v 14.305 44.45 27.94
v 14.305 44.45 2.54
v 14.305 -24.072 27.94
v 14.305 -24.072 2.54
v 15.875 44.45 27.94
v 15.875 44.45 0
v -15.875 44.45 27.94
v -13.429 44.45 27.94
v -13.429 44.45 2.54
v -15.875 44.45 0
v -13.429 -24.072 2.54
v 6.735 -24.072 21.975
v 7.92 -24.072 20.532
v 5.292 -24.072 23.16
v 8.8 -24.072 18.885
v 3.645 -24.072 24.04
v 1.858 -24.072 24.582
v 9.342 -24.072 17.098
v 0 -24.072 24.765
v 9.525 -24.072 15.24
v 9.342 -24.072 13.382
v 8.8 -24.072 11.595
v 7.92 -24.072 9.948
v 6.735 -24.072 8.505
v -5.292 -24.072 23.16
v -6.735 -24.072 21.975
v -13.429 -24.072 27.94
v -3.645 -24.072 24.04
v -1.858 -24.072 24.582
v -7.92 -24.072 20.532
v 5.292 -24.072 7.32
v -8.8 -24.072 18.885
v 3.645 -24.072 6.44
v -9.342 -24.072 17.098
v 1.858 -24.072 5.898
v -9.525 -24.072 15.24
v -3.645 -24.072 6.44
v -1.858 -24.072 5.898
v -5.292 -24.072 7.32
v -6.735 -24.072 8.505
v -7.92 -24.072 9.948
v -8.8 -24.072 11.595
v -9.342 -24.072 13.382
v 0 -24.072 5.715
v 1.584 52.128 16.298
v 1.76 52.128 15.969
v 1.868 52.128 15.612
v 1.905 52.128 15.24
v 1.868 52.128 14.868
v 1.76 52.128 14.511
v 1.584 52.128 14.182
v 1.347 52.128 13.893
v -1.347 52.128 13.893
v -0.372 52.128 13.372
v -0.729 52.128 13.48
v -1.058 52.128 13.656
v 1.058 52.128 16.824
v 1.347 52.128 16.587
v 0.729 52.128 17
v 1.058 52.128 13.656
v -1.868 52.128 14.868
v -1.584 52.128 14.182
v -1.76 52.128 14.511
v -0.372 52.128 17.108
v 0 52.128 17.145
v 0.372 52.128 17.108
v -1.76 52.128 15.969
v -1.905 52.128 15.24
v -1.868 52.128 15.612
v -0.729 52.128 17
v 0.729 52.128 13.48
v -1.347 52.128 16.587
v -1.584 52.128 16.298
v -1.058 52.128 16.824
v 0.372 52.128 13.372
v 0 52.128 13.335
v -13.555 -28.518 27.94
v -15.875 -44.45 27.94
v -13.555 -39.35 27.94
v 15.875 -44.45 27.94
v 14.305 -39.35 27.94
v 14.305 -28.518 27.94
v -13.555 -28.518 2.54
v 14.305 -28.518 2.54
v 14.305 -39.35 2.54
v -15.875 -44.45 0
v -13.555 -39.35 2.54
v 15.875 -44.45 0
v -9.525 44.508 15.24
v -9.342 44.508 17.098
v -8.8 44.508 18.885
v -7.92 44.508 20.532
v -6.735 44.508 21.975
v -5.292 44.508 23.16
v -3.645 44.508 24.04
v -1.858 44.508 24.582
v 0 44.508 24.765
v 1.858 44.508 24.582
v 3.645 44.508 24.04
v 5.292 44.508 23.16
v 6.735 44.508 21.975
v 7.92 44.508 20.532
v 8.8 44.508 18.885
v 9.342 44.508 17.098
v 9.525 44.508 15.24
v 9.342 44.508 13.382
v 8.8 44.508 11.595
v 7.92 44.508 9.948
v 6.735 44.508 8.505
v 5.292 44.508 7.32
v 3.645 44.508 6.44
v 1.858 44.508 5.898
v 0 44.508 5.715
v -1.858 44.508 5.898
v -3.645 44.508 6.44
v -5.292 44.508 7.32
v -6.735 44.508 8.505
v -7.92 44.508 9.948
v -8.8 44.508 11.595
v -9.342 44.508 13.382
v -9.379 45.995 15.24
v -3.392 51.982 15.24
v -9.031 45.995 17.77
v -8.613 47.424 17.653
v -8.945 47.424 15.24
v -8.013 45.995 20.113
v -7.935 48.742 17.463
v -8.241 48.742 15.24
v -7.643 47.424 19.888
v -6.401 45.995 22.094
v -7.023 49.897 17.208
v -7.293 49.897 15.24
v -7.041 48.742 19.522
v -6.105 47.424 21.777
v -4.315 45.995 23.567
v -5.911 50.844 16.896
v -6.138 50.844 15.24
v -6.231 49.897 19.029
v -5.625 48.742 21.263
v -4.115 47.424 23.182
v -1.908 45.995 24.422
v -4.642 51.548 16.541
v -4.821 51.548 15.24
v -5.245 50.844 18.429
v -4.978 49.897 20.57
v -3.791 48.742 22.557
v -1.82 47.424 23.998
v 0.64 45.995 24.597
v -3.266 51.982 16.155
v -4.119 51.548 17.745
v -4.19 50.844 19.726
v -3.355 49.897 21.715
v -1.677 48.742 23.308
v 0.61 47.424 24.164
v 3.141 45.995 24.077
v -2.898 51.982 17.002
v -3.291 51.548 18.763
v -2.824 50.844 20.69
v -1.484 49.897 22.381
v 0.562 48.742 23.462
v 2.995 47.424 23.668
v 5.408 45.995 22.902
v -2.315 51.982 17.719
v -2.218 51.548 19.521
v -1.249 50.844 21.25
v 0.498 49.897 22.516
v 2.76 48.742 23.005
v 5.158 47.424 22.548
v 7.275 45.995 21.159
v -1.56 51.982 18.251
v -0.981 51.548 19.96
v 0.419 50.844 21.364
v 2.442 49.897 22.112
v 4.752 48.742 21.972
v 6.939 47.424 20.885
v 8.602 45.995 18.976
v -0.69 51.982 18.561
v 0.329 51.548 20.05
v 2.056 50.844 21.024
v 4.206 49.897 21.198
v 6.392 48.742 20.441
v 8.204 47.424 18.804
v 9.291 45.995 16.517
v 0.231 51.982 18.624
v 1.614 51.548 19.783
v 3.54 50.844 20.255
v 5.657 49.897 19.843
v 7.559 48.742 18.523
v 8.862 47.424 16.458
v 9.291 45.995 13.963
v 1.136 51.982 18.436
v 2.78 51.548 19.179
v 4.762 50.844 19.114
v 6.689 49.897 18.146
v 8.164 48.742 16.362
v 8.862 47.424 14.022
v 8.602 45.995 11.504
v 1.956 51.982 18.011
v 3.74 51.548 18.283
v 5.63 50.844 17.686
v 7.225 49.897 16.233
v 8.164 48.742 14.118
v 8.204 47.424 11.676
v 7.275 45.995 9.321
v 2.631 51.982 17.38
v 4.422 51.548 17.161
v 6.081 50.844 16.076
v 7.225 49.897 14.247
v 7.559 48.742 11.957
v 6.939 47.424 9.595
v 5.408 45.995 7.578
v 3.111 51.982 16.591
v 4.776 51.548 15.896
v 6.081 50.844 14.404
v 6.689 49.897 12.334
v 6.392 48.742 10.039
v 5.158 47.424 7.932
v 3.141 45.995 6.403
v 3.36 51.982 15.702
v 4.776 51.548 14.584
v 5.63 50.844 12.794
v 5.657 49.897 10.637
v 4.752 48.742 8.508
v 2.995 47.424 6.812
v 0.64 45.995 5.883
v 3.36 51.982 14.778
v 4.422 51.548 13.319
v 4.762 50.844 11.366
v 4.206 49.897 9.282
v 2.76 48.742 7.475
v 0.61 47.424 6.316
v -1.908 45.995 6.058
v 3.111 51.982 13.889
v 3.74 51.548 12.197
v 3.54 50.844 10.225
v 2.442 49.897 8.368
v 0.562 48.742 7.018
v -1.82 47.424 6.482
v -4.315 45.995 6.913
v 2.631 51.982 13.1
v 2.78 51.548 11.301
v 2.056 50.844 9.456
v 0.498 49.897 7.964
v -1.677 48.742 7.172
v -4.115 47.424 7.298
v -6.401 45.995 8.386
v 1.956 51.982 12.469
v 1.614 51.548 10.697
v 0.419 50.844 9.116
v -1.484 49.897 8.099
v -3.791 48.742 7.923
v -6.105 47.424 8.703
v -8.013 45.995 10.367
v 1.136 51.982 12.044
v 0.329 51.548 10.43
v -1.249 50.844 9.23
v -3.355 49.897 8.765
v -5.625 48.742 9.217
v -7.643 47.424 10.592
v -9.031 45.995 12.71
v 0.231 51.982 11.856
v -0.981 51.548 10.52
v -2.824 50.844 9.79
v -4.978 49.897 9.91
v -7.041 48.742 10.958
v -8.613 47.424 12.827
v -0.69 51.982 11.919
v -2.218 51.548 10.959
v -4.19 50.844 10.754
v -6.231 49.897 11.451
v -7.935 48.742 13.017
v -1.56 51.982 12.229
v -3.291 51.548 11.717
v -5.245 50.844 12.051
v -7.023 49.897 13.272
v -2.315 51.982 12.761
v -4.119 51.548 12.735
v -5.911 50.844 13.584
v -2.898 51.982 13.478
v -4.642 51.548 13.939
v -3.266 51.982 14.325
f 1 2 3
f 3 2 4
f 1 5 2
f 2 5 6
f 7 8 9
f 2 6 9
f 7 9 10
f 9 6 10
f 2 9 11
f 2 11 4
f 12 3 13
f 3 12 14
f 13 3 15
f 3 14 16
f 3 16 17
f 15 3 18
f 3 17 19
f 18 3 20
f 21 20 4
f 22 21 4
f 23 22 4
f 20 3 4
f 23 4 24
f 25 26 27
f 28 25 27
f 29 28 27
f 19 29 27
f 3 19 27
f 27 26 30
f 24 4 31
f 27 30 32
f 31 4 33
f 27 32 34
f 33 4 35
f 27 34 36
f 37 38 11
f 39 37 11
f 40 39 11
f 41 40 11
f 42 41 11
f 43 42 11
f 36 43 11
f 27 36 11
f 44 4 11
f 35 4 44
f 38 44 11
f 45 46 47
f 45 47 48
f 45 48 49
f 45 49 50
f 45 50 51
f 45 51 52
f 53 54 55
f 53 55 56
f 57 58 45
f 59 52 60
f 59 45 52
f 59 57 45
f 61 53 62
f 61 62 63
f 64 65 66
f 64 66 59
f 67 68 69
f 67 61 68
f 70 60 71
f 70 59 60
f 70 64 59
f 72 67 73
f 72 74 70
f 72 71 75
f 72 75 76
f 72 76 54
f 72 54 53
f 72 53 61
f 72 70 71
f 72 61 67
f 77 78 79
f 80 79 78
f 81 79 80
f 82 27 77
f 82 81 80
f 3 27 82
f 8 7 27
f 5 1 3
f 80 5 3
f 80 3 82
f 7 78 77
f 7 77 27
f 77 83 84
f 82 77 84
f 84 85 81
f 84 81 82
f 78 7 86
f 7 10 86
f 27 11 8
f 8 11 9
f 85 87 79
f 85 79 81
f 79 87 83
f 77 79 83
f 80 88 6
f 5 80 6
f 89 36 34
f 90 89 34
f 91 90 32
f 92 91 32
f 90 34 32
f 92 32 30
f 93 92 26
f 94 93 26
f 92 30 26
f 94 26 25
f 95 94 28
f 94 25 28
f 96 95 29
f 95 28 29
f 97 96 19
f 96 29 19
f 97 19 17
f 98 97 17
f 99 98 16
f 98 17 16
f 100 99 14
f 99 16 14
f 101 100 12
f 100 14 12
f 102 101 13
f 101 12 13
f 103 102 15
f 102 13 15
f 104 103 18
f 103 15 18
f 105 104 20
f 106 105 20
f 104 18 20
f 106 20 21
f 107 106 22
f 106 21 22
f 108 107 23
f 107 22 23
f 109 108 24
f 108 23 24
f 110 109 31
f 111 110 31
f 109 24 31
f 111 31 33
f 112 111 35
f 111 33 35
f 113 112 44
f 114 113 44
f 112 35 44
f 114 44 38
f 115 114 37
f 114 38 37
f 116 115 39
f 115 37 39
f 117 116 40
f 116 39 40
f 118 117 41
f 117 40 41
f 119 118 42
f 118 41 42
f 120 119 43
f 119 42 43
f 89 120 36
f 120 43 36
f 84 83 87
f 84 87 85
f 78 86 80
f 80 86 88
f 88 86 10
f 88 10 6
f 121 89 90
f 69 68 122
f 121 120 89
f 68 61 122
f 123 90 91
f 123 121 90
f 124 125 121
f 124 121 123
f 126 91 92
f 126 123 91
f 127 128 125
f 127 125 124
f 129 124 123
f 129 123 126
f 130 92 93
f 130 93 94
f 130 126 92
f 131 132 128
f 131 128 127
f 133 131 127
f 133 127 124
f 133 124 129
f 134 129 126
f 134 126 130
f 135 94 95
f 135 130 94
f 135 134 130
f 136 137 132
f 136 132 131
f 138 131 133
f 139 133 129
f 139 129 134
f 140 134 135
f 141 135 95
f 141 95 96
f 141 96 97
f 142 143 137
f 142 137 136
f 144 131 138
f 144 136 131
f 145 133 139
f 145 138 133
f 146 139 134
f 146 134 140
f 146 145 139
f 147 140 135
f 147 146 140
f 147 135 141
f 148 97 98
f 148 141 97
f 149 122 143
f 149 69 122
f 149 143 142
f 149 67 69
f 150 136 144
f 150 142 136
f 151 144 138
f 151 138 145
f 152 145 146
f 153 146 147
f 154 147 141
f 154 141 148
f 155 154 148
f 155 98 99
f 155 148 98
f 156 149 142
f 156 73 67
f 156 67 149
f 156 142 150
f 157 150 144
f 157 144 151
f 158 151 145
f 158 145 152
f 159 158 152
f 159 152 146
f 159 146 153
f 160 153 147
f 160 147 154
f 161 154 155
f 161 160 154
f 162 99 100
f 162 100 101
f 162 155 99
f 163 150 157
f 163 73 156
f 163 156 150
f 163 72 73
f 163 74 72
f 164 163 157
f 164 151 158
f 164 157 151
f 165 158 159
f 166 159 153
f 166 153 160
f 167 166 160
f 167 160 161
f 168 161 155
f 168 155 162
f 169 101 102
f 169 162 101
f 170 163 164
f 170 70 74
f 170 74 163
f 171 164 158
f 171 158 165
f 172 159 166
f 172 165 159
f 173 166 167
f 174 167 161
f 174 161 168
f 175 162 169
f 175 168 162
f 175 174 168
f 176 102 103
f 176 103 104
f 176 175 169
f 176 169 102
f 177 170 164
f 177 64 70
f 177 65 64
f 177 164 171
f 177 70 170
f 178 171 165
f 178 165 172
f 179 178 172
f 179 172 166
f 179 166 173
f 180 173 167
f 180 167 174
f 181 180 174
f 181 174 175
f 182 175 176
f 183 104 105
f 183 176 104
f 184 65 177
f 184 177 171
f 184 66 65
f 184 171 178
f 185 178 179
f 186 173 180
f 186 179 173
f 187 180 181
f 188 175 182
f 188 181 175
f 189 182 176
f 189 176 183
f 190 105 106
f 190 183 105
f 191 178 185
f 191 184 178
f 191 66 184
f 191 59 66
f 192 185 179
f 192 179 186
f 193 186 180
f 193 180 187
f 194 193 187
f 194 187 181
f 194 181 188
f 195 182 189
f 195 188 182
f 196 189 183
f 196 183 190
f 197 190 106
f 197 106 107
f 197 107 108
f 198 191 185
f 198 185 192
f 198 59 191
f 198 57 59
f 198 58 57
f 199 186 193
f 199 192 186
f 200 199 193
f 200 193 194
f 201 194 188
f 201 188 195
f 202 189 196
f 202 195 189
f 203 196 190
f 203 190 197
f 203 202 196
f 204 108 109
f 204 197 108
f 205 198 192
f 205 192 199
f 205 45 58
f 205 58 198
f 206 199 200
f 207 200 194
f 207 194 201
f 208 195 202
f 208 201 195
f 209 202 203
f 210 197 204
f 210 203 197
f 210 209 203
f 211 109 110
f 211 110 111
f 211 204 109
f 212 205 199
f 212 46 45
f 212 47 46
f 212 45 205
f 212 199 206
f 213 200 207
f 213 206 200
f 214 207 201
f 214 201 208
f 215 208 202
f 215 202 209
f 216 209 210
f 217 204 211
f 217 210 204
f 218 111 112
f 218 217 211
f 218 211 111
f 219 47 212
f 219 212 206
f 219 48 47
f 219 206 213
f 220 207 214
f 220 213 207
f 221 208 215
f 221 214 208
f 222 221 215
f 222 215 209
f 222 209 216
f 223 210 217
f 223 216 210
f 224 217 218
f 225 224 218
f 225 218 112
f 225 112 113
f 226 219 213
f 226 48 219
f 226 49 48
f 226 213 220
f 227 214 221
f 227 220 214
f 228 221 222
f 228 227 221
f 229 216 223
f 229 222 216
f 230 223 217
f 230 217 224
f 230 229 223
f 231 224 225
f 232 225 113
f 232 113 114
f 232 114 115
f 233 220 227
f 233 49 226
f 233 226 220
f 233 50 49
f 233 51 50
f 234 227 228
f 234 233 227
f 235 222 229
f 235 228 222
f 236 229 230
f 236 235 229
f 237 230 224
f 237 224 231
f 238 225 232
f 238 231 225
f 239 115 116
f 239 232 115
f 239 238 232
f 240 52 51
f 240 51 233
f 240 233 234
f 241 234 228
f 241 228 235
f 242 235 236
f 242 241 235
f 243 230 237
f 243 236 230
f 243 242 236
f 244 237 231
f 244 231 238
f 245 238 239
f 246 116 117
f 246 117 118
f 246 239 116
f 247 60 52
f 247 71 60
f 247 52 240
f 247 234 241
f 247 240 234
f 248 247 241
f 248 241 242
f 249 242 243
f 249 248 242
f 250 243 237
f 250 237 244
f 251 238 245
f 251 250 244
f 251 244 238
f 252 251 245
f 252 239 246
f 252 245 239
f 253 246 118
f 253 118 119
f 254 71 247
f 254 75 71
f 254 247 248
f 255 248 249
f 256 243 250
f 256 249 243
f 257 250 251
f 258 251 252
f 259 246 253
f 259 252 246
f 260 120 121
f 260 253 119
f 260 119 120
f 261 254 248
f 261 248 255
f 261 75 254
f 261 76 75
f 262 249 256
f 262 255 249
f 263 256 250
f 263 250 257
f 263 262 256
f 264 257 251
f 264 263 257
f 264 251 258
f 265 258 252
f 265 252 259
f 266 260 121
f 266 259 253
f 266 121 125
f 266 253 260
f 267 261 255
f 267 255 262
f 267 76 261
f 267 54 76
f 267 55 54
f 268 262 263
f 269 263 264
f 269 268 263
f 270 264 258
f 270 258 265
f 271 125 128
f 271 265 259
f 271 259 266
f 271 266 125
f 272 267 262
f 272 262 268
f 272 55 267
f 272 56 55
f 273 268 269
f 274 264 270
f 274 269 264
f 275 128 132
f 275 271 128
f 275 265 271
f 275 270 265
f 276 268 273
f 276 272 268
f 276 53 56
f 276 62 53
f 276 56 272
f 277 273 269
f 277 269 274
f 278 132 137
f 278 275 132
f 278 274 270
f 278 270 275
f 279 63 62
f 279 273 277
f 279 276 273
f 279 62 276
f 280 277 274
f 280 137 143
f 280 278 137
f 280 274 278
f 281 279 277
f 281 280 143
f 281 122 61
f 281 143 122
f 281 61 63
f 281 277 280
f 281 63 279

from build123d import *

# Parameters (mm, degrees)
F0_W     = 31.75
F0_H     = 88.9
F1_DEPTH = 2.54
F2_W     = 27.860178
F2_H     = 10.831637
F3_DEPTH = 25.4
F4_R     = 9.525
F5_DEPTH = 76.2
F6_R     = 7.62


with BuildPart() as f1:
    # F0 (on Top) → F1 (new body)
    with BuildSketch(Plane.XY):
        Rectangle(F0_W, F0_H)
    extrude(amount=F1_DEPTH)

    # F2 (on face) → F3 (join)
    with BuildSketch(Plane.XY.offset(2.54)):
        Polygon((15.875, -44.45), (15.875, 44.45), (14.305094, 44.45), (14.305094, -24.071639), (-13.428997, -24.071639), (-13.428997, 44.45), (-15.643887, 44.45), (-15.875, 44.45), (-15.875, -44.45), align=None)
        with Locations((0.375005, -33.933696)):
            Rectangle(F2_W, F2_H, mode=Mode.SUBTRACT)
    extrude(amount=F3_DEPTH)

    # F4 (on face) → F5 (join)
    with BuildSketch(Plane(origin=(0, -24.071639, 0), x_dir=(-1, 0, 0), z_dir=(0, 1, 0))):
        with Locations((0, 15.24)):
            Circle(F4_R)
    extrude(amount=F5_DEPTH)

    # F6
    f6_edges = [f1.edges().sort_by_distance(p)[0] for p in [
        (9.525, 52.128361, 15.24),
    ]]
    fillet(f6_edges, radius=F6_R)


solid = f1.part
